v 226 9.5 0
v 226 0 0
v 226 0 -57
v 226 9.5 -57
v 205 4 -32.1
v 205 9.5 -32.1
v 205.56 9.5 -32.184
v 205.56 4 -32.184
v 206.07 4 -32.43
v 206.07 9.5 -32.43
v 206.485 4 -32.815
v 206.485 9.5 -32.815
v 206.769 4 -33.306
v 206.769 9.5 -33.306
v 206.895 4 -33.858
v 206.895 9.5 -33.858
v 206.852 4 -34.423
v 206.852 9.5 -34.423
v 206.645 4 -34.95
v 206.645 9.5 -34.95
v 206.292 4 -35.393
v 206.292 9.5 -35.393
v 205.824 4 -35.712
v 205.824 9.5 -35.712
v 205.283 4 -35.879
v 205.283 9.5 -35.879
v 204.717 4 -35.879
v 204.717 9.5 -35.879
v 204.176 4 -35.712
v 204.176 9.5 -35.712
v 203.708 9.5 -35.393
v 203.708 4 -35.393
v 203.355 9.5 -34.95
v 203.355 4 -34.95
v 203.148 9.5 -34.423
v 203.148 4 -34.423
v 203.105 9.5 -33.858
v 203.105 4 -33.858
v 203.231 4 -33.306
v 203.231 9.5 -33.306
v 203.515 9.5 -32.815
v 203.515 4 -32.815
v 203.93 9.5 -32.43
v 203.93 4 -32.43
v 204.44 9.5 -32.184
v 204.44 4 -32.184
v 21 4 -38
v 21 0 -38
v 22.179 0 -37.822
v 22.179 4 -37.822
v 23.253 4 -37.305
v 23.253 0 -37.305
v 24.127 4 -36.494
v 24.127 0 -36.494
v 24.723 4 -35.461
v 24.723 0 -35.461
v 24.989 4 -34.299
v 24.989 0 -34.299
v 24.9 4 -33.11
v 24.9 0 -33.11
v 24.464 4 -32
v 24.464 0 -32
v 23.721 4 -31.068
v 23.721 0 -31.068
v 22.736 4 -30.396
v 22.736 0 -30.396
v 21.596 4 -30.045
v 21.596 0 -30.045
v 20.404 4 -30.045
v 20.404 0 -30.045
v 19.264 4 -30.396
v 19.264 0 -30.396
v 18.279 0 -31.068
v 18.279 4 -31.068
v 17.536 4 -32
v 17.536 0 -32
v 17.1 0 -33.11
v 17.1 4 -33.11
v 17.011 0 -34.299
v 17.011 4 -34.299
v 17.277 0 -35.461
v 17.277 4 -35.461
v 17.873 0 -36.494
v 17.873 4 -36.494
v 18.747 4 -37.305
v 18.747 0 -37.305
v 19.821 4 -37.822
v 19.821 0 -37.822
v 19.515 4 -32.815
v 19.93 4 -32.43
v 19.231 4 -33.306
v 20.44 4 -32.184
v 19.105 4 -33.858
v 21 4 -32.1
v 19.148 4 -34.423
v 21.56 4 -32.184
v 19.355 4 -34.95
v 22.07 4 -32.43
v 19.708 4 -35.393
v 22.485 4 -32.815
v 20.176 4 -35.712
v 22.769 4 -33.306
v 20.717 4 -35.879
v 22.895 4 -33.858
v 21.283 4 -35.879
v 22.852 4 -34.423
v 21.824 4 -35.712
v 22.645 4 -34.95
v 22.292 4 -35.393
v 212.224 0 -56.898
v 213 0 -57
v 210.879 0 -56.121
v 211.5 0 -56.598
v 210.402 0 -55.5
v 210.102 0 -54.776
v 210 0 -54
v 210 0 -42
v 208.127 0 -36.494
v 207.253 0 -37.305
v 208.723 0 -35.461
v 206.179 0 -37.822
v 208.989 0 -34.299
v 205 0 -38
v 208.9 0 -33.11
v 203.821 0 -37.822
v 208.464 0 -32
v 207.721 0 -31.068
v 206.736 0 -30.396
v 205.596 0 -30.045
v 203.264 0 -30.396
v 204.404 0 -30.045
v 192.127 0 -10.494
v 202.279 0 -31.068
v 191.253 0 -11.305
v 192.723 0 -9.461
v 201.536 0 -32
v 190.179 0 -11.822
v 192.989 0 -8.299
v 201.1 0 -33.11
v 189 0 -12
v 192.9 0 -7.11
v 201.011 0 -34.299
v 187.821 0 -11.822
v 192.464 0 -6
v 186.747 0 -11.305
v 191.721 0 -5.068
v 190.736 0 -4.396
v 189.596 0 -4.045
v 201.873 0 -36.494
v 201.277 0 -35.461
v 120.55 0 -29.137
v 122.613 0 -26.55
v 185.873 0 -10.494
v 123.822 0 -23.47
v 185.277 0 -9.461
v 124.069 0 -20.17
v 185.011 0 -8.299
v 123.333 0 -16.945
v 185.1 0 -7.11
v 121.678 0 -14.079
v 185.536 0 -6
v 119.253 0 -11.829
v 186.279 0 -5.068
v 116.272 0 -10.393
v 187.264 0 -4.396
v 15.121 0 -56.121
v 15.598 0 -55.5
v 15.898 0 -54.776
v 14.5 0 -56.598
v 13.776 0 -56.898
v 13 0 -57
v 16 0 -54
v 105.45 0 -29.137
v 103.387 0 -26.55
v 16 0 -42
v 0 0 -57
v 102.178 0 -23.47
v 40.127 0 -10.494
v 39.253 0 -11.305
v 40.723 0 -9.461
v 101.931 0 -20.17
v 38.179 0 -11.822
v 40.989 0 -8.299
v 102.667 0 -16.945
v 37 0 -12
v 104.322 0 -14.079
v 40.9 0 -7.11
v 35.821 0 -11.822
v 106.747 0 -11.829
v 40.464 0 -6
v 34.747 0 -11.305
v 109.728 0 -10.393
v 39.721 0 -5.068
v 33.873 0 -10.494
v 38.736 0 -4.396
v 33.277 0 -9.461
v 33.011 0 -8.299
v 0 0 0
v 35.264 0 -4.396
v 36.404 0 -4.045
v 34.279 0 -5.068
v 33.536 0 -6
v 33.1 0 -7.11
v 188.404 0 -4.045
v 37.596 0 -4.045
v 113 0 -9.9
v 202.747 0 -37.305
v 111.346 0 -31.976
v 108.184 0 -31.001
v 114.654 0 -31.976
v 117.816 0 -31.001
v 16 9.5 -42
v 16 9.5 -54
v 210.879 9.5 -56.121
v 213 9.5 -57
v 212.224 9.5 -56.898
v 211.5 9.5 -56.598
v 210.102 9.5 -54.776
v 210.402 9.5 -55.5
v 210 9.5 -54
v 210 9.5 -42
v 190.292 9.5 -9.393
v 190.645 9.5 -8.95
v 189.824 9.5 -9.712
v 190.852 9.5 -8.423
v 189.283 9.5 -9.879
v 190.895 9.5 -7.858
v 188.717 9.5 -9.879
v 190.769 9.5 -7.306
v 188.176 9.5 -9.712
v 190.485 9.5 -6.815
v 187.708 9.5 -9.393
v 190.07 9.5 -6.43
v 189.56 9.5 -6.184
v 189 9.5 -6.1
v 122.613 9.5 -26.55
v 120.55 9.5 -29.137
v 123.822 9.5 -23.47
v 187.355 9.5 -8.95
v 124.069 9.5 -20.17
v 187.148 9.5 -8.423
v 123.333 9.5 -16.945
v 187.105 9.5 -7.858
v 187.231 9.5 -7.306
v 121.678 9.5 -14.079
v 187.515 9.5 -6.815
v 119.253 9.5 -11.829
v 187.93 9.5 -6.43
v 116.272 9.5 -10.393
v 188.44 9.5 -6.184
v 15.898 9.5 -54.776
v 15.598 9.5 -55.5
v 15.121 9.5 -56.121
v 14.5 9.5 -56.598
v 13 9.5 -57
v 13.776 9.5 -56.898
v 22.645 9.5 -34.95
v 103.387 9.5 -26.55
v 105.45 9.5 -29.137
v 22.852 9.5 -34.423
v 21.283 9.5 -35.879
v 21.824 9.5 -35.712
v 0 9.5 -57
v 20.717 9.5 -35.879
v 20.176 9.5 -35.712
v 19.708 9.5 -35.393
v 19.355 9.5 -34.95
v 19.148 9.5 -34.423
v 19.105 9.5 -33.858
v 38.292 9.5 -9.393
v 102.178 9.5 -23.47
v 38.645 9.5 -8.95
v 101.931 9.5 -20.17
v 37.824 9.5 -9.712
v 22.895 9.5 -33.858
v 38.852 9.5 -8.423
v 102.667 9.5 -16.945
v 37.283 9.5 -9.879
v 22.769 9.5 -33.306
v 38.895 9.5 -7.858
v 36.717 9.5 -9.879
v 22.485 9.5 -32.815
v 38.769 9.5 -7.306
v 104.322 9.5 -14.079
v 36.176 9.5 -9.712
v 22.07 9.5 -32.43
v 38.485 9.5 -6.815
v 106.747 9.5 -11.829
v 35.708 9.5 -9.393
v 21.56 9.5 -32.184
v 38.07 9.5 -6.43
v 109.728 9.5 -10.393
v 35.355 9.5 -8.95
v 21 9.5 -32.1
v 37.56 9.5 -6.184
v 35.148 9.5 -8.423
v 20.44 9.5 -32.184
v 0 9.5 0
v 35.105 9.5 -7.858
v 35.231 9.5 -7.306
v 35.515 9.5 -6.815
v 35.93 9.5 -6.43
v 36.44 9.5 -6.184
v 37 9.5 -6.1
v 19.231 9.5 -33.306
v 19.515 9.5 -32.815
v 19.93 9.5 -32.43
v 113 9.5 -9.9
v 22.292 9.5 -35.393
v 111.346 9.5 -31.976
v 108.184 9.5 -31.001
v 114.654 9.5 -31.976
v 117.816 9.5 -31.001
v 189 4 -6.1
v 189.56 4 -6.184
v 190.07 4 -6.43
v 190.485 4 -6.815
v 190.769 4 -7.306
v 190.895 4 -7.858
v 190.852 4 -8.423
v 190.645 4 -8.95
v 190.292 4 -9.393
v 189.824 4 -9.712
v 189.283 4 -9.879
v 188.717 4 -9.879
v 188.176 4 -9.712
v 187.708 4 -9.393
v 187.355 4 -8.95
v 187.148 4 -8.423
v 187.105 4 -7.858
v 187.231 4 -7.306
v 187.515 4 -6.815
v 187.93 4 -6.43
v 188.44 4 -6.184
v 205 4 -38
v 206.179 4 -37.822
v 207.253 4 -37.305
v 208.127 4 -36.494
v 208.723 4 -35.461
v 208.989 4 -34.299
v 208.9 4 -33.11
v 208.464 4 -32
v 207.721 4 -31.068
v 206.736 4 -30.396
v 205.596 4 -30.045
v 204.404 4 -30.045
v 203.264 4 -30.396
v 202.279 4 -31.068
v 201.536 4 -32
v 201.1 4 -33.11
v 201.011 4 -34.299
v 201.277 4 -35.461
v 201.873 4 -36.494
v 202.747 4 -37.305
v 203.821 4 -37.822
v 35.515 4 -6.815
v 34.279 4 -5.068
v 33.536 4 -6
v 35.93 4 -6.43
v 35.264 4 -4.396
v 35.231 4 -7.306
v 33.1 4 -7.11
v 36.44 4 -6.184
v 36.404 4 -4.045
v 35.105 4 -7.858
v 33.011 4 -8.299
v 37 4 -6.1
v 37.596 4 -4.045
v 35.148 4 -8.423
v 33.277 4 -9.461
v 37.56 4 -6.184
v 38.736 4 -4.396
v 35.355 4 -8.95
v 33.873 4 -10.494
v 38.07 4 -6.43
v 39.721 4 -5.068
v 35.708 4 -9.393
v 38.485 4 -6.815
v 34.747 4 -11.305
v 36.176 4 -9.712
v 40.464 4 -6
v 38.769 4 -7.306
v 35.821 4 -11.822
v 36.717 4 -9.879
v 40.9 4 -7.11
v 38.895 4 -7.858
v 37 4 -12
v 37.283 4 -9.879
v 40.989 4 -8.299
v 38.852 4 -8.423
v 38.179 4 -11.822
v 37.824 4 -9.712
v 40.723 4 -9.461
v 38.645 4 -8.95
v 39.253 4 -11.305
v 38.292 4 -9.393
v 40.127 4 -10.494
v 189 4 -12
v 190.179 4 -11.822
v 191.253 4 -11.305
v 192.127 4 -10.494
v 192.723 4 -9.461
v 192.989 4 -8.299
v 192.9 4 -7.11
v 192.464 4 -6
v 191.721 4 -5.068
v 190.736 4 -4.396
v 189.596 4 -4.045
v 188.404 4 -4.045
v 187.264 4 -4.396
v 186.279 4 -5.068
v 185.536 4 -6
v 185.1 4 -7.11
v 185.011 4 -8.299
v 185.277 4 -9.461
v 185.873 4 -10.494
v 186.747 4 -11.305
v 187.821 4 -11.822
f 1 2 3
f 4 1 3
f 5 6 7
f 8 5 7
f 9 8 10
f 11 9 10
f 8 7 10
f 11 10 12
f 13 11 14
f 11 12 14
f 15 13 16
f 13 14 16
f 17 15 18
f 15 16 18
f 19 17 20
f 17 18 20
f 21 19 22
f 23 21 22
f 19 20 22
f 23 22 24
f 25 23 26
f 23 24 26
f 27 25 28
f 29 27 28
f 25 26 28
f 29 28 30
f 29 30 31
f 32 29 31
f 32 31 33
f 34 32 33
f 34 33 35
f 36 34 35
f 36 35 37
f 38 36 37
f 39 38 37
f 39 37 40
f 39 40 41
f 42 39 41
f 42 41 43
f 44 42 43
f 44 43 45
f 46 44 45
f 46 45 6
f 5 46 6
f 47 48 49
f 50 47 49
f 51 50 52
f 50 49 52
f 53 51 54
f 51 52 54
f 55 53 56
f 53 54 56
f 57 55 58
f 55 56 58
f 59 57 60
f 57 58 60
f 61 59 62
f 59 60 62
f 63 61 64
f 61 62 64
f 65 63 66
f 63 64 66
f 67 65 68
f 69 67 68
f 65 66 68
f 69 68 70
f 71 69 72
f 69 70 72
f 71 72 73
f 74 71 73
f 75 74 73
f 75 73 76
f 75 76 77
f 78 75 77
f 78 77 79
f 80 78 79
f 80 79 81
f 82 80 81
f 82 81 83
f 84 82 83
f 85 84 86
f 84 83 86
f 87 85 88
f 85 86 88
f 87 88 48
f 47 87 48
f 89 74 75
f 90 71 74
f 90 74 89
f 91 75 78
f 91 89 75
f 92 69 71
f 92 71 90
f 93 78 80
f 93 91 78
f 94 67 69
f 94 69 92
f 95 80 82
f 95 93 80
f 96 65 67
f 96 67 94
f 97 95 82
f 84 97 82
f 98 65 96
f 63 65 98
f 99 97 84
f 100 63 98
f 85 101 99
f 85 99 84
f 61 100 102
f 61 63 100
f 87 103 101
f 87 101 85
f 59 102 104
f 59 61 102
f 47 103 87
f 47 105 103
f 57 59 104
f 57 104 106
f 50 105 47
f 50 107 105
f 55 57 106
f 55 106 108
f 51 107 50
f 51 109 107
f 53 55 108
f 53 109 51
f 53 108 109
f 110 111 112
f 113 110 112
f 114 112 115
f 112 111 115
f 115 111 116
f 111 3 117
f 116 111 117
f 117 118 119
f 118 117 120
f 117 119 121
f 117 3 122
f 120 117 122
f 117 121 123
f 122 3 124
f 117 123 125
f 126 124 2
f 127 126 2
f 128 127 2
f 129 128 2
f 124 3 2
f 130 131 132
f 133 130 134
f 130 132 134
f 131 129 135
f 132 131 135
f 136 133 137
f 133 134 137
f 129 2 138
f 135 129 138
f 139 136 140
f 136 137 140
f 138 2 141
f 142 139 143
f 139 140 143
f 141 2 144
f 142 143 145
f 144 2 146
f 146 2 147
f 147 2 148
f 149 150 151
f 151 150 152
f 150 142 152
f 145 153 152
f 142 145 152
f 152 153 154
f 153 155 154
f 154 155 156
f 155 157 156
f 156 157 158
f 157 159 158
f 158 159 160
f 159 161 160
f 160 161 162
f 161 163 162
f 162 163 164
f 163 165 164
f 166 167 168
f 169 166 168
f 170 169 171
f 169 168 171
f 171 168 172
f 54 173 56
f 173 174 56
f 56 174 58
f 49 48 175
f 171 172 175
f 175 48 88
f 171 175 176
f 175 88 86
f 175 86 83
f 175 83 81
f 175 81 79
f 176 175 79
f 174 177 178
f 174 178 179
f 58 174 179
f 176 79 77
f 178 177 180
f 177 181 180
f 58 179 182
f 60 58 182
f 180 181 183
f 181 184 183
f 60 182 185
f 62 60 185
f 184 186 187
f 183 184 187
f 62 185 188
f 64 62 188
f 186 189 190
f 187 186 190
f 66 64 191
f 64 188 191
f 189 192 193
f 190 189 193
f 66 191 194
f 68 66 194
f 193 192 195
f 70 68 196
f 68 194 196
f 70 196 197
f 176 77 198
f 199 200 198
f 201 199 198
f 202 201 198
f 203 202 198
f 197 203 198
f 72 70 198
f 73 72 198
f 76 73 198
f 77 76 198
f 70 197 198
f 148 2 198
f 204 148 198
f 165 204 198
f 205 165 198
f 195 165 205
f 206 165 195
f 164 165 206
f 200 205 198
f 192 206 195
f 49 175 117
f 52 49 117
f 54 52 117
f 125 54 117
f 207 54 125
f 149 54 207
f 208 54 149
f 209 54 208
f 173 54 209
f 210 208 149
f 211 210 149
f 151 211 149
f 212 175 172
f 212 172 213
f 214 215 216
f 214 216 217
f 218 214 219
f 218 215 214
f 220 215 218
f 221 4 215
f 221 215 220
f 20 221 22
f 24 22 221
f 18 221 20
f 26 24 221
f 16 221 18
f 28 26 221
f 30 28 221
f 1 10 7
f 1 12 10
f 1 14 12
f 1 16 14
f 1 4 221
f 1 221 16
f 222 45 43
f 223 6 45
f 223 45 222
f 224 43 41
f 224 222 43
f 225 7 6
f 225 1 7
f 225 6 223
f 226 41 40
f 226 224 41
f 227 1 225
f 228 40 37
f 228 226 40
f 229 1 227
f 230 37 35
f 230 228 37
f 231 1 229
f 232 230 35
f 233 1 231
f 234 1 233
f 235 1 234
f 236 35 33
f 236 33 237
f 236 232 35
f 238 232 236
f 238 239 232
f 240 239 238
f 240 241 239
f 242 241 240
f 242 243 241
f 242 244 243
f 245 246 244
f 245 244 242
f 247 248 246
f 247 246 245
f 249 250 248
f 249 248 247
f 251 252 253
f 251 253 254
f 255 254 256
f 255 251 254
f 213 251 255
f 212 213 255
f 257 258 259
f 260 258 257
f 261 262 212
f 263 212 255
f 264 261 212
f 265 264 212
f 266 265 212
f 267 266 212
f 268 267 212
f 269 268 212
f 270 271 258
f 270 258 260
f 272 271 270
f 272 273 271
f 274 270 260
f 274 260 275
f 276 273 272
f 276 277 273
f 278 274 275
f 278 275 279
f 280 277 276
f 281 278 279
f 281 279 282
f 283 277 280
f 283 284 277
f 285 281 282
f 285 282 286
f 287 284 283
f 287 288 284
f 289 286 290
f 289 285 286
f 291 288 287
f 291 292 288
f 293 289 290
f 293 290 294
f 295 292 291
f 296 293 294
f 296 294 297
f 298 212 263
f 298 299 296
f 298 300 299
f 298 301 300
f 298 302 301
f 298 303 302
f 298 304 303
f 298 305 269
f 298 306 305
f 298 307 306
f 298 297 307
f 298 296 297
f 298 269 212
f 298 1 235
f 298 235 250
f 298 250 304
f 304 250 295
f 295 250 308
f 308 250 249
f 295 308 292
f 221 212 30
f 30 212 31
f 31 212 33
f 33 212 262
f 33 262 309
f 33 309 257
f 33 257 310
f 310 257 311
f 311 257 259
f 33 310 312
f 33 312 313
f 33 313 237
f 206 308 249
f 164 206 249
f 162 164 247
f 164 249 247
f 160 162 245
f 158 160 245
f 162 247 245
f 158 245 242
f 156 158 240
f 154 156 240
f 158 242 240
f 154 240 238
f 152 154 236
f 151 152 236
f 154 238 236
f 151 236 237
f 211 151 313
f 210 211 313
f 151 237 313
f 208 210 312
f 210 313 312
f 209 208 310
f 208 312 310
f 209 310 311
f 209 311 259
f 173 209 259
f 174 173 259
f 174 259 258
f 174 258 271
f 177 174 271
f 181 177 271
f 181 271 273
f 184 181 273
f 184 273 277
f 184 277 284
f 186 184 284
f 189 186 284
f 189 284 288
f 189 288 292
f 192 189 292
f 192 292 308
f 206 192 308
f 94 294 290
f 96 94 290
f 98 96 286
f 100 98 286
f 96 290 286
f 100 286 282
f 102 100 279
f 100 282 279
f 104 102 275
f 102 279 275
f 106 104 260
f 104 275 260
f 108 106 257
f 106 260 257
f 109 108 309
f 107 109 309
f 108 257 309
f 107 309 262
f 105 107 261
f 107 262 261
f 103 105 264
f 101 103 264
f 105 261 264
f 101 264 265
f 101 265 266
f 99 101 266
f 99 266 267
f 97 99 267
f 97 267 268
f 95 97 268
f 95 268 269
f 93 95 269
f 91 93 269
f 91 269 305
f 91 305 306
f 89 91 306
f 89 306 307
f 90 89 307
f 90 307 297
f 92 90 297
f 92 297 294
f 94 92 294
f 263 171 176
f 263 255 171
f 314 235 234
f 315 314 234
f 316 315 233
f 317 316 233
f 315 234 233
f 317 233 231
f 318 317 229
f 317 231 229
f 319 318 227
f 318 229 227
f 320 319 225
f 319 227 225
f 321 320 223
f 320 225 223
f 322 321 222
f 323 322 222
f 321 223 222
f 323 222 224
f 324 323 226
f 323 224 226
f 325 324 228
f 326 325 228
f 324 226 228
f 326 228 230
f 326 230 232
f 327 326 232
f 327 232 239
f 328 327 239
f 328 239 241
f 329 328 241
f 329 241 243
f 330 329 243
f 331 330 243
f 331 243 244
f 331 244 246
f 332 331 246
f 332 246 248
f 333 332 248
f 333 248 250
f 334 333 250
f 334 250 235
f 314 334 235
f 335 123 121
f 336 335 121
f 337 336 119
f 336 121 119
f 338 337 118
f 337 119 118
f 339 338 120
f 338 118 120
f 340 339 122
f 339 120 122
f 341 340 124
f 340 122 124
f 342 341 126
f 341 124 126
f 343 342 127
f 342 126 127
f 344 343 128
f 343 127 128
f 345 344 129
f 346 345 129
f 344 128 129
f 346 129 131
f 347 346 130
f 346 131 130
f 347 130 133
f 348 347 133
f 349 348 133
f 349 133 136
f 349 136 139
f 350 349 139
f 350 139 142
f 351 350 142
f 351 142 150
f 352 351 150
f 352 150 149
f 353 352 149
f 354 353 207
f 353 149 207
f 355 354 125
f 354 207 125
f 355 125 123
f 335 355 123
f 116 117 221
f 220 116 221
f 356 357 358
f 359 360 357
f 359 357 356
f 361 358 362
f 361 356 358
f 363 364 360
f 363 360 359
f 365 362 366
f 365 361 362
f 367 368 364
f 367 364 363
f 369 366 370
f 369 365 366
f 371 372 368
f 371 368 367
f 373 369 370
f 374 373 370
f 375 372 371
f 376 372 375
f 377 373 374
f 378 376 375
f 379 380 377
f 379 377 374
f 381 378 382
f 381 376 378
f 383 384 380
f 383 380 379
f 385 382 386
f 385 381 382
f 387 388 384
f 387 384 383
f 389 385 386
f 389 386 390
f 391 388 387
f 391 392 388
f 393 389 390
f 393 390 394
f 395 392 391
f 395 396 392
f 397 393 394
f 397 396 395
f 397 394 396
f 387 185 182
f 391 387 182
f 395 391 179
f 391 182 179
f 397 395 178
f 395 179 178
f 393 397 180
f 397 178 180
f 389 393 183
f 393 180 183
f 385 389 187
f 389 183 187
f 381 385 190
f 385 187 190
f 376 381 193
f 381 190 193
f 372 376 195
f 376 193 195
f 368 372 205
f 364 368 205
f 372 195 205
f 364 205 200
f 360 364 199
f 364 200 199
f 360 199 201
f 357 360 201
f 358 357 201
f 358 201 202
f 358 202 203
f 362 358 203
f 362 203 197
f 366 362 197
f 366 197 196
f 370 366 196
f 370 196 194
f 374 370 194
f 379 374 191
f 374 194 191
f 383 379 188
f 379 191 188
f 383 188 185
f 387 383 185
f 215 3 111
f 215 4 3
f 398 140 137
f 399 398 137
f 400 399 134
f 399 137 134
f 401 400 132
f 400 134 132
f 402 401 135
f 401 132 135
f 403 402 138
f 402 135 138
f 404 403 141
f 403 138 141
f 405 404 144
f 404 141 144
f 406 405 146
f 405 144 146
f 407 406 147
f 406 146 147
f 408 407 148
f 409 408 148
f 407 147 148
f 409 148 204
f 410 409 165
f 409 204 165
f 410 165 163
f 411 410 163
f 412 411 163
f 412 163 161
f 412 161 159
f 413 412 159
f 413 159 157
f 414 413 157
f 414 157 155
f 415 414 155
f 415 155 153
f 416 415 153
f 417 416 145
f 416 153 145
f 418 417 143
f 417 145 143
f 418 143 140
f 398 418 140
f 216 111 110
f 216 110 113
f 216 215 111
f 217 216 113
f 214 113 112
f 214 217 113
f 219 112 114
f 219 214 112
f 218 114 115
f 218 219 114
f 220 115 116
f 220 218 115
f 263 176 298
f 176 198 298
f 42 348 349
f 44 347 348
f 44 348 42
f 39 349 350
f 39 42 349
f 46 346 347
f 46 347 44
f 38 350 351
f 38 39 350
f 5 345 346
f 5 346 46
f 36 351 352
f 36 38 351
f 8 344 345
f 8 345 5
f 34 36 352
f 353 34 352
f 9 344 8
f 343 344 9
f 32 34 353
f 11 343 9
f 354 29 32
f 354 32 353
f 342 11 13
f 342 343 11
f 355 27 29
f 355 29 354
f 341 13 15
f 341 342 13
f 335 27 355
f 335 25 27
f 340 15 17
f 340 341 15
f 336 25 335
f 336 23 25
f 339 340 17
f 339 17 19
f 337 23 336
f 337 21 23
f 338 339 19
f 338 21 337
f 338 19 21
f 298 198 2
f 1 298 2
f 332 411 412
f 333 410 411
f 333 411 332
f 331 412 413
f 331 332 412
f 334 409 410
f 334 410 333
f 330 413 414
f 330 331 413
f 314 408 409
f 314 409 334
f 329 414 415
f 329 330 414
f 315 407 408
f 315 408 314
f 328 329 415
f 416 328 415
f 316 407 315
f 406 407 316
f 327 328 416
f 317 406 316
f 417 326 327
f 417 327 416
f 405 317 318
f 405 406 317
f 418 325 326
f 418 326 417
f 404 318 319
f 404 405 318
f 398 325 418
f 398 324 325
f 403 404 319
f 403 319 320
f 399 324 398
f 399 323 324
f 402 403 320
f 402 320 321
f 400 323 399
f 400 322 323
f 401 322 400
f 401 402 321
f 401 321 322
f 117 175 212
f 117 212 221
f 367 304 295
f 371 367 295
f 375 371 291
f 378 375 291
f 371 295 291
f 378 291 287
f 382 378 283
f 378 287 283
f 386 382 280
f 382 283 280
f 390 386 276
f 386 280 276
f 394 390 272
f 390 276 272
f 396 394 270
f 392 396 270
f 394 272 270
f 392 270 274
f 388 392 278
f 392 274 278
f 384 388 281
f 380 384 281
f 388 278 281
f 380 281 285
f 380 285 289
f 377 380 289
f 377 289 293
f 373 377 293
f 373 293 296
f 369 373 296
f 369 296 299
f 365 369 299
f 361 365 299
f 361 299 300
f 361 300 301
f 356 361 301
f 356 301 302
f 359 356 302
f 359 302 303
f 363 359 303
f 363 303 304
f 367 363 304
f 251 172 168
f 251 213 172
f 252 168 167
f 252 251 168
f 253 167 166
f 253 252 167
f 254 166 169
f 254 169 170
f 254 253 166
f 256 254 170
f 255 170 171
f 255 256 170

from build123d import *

# Parameters (mm, degrees)
SKETCH_1_W          = 226
SKETCH_1_H          = 42
EXTRUDE_1_DEPTH     = 9.5
SKETCH_6_W          = 16
SKETCH_6_H          = 9.5
EXTRUDE_4_DEPTH     = 15
FILLET_1_R          = 3
SKETCH_7_R          = 1.9
CUT_EXTRUDE_1_DEPTH = 234.270765421
SKETCH_9_R          = 11.1
CUT_EXTRUDE_2_DEPTH = 10
SKETCH_11_R         = 4
CUT_EXTRUDE_4_DEPTH = 4


with BuildPart() as part:
    # 草图1 → 凸台-拉伸1 (new body)
    with BuildSketch(Plane(origin=(0, 0, 0), x_dir=(1, 0, 0), z_dir=(0, 1, 0))):
        with Locations((113, 21)):
            Rectangle(SKETCH_1_W, SKETCH_1_H)
    extrude(amount=EXTRUDE_1_DEPTH)

    # 草图6 → 凸台-拉伸4 (add)
    with BuildSketch(Plane(origin=(0, 0, -42), x_dir=(-1, 0, 0), z_dir=(0, 0, -1))):
        with Locations((-8, 4.75)):
            Rectangle(SKETCH_6_W, SKETCH_6_H)
        with Locations((-218, 4.75)):
            Rectangle(SKETCH_6_W, SKETCH_6_H)
    extrude(amount=EXTRUDE_4_DEPTH)

    # 圆角1
    fillet_1_edges = [part.edges().sort_by_distance(p)[0] for p in [
        (16, 4.75, -57),
        (210, 4.75, -57),
    ]]
    fillet(fillet_1_edges, radius=FILLET_1_R)

    # 草图7 → 切除-拉伸1 (cut, through all)
    with BuildSketch(Plane(origin=(0, 9.5, 0), x_dir=(1, 0, 0), z_dir=(0, 1, 0))):
        with Locations(Location((21, 34, 0), (0, 0, 270))):
            Circle(SKETCH_7_R)
        with Locations(Location((37, 8, 0), (0, 0, 270))):
            Circle(SKETCH_7_R)
        with Locations(Location((189, 8, 0), (0, 0, 270))):
            Circle(SKETCH_7_R)
        with Locations(Location((205, 34, 0), (0, 0, 270))):
            Circle(SKETCH_7_R)
    extrude(amount=-CUT_EXTRUDE_1_DEPTH, mode=Mode.SUBTRACT)

    # 草图9 → 切除-拉伸2 (cut)
    with BuildSketch(Plane(origin=(0, 9.5, 0), x_dir=(1, 0, 0), z_dir=(0, 1, 0))):
        with Locations(Location((113, 21, 0), (0, 0, 270))):
            Circle(SKETCH_9_R)
    extrude(amount=-CUT_EXTRUDE_2_DEPTH, mode=Mode.SUBTRACT)

    # 草图11 → 切除-拉伸4 (cut)
    with BuildSketch(Plane.XZ):
        with Locations(Location((37, -8, 0), (0, 0, 270))):
            Circle(SKETCH_11_R)
        with Locations(Location((21, -34, 0), (0, 0, 270))):
            Circle(SKETCH_11_R)
        with Locations(Location((189, -8, 0), (0, 0, 270))):
            Circle(SKETCH_11_R)
        with Locations(Location((205, -34, 0), (0, 0, 270))):
            Circle(SKETCH_11_R)
    extrude(amount=-CUT_EXTRUDE_4_DEPTH, mode=Mode.SUBTRACT)


solid = part.part
